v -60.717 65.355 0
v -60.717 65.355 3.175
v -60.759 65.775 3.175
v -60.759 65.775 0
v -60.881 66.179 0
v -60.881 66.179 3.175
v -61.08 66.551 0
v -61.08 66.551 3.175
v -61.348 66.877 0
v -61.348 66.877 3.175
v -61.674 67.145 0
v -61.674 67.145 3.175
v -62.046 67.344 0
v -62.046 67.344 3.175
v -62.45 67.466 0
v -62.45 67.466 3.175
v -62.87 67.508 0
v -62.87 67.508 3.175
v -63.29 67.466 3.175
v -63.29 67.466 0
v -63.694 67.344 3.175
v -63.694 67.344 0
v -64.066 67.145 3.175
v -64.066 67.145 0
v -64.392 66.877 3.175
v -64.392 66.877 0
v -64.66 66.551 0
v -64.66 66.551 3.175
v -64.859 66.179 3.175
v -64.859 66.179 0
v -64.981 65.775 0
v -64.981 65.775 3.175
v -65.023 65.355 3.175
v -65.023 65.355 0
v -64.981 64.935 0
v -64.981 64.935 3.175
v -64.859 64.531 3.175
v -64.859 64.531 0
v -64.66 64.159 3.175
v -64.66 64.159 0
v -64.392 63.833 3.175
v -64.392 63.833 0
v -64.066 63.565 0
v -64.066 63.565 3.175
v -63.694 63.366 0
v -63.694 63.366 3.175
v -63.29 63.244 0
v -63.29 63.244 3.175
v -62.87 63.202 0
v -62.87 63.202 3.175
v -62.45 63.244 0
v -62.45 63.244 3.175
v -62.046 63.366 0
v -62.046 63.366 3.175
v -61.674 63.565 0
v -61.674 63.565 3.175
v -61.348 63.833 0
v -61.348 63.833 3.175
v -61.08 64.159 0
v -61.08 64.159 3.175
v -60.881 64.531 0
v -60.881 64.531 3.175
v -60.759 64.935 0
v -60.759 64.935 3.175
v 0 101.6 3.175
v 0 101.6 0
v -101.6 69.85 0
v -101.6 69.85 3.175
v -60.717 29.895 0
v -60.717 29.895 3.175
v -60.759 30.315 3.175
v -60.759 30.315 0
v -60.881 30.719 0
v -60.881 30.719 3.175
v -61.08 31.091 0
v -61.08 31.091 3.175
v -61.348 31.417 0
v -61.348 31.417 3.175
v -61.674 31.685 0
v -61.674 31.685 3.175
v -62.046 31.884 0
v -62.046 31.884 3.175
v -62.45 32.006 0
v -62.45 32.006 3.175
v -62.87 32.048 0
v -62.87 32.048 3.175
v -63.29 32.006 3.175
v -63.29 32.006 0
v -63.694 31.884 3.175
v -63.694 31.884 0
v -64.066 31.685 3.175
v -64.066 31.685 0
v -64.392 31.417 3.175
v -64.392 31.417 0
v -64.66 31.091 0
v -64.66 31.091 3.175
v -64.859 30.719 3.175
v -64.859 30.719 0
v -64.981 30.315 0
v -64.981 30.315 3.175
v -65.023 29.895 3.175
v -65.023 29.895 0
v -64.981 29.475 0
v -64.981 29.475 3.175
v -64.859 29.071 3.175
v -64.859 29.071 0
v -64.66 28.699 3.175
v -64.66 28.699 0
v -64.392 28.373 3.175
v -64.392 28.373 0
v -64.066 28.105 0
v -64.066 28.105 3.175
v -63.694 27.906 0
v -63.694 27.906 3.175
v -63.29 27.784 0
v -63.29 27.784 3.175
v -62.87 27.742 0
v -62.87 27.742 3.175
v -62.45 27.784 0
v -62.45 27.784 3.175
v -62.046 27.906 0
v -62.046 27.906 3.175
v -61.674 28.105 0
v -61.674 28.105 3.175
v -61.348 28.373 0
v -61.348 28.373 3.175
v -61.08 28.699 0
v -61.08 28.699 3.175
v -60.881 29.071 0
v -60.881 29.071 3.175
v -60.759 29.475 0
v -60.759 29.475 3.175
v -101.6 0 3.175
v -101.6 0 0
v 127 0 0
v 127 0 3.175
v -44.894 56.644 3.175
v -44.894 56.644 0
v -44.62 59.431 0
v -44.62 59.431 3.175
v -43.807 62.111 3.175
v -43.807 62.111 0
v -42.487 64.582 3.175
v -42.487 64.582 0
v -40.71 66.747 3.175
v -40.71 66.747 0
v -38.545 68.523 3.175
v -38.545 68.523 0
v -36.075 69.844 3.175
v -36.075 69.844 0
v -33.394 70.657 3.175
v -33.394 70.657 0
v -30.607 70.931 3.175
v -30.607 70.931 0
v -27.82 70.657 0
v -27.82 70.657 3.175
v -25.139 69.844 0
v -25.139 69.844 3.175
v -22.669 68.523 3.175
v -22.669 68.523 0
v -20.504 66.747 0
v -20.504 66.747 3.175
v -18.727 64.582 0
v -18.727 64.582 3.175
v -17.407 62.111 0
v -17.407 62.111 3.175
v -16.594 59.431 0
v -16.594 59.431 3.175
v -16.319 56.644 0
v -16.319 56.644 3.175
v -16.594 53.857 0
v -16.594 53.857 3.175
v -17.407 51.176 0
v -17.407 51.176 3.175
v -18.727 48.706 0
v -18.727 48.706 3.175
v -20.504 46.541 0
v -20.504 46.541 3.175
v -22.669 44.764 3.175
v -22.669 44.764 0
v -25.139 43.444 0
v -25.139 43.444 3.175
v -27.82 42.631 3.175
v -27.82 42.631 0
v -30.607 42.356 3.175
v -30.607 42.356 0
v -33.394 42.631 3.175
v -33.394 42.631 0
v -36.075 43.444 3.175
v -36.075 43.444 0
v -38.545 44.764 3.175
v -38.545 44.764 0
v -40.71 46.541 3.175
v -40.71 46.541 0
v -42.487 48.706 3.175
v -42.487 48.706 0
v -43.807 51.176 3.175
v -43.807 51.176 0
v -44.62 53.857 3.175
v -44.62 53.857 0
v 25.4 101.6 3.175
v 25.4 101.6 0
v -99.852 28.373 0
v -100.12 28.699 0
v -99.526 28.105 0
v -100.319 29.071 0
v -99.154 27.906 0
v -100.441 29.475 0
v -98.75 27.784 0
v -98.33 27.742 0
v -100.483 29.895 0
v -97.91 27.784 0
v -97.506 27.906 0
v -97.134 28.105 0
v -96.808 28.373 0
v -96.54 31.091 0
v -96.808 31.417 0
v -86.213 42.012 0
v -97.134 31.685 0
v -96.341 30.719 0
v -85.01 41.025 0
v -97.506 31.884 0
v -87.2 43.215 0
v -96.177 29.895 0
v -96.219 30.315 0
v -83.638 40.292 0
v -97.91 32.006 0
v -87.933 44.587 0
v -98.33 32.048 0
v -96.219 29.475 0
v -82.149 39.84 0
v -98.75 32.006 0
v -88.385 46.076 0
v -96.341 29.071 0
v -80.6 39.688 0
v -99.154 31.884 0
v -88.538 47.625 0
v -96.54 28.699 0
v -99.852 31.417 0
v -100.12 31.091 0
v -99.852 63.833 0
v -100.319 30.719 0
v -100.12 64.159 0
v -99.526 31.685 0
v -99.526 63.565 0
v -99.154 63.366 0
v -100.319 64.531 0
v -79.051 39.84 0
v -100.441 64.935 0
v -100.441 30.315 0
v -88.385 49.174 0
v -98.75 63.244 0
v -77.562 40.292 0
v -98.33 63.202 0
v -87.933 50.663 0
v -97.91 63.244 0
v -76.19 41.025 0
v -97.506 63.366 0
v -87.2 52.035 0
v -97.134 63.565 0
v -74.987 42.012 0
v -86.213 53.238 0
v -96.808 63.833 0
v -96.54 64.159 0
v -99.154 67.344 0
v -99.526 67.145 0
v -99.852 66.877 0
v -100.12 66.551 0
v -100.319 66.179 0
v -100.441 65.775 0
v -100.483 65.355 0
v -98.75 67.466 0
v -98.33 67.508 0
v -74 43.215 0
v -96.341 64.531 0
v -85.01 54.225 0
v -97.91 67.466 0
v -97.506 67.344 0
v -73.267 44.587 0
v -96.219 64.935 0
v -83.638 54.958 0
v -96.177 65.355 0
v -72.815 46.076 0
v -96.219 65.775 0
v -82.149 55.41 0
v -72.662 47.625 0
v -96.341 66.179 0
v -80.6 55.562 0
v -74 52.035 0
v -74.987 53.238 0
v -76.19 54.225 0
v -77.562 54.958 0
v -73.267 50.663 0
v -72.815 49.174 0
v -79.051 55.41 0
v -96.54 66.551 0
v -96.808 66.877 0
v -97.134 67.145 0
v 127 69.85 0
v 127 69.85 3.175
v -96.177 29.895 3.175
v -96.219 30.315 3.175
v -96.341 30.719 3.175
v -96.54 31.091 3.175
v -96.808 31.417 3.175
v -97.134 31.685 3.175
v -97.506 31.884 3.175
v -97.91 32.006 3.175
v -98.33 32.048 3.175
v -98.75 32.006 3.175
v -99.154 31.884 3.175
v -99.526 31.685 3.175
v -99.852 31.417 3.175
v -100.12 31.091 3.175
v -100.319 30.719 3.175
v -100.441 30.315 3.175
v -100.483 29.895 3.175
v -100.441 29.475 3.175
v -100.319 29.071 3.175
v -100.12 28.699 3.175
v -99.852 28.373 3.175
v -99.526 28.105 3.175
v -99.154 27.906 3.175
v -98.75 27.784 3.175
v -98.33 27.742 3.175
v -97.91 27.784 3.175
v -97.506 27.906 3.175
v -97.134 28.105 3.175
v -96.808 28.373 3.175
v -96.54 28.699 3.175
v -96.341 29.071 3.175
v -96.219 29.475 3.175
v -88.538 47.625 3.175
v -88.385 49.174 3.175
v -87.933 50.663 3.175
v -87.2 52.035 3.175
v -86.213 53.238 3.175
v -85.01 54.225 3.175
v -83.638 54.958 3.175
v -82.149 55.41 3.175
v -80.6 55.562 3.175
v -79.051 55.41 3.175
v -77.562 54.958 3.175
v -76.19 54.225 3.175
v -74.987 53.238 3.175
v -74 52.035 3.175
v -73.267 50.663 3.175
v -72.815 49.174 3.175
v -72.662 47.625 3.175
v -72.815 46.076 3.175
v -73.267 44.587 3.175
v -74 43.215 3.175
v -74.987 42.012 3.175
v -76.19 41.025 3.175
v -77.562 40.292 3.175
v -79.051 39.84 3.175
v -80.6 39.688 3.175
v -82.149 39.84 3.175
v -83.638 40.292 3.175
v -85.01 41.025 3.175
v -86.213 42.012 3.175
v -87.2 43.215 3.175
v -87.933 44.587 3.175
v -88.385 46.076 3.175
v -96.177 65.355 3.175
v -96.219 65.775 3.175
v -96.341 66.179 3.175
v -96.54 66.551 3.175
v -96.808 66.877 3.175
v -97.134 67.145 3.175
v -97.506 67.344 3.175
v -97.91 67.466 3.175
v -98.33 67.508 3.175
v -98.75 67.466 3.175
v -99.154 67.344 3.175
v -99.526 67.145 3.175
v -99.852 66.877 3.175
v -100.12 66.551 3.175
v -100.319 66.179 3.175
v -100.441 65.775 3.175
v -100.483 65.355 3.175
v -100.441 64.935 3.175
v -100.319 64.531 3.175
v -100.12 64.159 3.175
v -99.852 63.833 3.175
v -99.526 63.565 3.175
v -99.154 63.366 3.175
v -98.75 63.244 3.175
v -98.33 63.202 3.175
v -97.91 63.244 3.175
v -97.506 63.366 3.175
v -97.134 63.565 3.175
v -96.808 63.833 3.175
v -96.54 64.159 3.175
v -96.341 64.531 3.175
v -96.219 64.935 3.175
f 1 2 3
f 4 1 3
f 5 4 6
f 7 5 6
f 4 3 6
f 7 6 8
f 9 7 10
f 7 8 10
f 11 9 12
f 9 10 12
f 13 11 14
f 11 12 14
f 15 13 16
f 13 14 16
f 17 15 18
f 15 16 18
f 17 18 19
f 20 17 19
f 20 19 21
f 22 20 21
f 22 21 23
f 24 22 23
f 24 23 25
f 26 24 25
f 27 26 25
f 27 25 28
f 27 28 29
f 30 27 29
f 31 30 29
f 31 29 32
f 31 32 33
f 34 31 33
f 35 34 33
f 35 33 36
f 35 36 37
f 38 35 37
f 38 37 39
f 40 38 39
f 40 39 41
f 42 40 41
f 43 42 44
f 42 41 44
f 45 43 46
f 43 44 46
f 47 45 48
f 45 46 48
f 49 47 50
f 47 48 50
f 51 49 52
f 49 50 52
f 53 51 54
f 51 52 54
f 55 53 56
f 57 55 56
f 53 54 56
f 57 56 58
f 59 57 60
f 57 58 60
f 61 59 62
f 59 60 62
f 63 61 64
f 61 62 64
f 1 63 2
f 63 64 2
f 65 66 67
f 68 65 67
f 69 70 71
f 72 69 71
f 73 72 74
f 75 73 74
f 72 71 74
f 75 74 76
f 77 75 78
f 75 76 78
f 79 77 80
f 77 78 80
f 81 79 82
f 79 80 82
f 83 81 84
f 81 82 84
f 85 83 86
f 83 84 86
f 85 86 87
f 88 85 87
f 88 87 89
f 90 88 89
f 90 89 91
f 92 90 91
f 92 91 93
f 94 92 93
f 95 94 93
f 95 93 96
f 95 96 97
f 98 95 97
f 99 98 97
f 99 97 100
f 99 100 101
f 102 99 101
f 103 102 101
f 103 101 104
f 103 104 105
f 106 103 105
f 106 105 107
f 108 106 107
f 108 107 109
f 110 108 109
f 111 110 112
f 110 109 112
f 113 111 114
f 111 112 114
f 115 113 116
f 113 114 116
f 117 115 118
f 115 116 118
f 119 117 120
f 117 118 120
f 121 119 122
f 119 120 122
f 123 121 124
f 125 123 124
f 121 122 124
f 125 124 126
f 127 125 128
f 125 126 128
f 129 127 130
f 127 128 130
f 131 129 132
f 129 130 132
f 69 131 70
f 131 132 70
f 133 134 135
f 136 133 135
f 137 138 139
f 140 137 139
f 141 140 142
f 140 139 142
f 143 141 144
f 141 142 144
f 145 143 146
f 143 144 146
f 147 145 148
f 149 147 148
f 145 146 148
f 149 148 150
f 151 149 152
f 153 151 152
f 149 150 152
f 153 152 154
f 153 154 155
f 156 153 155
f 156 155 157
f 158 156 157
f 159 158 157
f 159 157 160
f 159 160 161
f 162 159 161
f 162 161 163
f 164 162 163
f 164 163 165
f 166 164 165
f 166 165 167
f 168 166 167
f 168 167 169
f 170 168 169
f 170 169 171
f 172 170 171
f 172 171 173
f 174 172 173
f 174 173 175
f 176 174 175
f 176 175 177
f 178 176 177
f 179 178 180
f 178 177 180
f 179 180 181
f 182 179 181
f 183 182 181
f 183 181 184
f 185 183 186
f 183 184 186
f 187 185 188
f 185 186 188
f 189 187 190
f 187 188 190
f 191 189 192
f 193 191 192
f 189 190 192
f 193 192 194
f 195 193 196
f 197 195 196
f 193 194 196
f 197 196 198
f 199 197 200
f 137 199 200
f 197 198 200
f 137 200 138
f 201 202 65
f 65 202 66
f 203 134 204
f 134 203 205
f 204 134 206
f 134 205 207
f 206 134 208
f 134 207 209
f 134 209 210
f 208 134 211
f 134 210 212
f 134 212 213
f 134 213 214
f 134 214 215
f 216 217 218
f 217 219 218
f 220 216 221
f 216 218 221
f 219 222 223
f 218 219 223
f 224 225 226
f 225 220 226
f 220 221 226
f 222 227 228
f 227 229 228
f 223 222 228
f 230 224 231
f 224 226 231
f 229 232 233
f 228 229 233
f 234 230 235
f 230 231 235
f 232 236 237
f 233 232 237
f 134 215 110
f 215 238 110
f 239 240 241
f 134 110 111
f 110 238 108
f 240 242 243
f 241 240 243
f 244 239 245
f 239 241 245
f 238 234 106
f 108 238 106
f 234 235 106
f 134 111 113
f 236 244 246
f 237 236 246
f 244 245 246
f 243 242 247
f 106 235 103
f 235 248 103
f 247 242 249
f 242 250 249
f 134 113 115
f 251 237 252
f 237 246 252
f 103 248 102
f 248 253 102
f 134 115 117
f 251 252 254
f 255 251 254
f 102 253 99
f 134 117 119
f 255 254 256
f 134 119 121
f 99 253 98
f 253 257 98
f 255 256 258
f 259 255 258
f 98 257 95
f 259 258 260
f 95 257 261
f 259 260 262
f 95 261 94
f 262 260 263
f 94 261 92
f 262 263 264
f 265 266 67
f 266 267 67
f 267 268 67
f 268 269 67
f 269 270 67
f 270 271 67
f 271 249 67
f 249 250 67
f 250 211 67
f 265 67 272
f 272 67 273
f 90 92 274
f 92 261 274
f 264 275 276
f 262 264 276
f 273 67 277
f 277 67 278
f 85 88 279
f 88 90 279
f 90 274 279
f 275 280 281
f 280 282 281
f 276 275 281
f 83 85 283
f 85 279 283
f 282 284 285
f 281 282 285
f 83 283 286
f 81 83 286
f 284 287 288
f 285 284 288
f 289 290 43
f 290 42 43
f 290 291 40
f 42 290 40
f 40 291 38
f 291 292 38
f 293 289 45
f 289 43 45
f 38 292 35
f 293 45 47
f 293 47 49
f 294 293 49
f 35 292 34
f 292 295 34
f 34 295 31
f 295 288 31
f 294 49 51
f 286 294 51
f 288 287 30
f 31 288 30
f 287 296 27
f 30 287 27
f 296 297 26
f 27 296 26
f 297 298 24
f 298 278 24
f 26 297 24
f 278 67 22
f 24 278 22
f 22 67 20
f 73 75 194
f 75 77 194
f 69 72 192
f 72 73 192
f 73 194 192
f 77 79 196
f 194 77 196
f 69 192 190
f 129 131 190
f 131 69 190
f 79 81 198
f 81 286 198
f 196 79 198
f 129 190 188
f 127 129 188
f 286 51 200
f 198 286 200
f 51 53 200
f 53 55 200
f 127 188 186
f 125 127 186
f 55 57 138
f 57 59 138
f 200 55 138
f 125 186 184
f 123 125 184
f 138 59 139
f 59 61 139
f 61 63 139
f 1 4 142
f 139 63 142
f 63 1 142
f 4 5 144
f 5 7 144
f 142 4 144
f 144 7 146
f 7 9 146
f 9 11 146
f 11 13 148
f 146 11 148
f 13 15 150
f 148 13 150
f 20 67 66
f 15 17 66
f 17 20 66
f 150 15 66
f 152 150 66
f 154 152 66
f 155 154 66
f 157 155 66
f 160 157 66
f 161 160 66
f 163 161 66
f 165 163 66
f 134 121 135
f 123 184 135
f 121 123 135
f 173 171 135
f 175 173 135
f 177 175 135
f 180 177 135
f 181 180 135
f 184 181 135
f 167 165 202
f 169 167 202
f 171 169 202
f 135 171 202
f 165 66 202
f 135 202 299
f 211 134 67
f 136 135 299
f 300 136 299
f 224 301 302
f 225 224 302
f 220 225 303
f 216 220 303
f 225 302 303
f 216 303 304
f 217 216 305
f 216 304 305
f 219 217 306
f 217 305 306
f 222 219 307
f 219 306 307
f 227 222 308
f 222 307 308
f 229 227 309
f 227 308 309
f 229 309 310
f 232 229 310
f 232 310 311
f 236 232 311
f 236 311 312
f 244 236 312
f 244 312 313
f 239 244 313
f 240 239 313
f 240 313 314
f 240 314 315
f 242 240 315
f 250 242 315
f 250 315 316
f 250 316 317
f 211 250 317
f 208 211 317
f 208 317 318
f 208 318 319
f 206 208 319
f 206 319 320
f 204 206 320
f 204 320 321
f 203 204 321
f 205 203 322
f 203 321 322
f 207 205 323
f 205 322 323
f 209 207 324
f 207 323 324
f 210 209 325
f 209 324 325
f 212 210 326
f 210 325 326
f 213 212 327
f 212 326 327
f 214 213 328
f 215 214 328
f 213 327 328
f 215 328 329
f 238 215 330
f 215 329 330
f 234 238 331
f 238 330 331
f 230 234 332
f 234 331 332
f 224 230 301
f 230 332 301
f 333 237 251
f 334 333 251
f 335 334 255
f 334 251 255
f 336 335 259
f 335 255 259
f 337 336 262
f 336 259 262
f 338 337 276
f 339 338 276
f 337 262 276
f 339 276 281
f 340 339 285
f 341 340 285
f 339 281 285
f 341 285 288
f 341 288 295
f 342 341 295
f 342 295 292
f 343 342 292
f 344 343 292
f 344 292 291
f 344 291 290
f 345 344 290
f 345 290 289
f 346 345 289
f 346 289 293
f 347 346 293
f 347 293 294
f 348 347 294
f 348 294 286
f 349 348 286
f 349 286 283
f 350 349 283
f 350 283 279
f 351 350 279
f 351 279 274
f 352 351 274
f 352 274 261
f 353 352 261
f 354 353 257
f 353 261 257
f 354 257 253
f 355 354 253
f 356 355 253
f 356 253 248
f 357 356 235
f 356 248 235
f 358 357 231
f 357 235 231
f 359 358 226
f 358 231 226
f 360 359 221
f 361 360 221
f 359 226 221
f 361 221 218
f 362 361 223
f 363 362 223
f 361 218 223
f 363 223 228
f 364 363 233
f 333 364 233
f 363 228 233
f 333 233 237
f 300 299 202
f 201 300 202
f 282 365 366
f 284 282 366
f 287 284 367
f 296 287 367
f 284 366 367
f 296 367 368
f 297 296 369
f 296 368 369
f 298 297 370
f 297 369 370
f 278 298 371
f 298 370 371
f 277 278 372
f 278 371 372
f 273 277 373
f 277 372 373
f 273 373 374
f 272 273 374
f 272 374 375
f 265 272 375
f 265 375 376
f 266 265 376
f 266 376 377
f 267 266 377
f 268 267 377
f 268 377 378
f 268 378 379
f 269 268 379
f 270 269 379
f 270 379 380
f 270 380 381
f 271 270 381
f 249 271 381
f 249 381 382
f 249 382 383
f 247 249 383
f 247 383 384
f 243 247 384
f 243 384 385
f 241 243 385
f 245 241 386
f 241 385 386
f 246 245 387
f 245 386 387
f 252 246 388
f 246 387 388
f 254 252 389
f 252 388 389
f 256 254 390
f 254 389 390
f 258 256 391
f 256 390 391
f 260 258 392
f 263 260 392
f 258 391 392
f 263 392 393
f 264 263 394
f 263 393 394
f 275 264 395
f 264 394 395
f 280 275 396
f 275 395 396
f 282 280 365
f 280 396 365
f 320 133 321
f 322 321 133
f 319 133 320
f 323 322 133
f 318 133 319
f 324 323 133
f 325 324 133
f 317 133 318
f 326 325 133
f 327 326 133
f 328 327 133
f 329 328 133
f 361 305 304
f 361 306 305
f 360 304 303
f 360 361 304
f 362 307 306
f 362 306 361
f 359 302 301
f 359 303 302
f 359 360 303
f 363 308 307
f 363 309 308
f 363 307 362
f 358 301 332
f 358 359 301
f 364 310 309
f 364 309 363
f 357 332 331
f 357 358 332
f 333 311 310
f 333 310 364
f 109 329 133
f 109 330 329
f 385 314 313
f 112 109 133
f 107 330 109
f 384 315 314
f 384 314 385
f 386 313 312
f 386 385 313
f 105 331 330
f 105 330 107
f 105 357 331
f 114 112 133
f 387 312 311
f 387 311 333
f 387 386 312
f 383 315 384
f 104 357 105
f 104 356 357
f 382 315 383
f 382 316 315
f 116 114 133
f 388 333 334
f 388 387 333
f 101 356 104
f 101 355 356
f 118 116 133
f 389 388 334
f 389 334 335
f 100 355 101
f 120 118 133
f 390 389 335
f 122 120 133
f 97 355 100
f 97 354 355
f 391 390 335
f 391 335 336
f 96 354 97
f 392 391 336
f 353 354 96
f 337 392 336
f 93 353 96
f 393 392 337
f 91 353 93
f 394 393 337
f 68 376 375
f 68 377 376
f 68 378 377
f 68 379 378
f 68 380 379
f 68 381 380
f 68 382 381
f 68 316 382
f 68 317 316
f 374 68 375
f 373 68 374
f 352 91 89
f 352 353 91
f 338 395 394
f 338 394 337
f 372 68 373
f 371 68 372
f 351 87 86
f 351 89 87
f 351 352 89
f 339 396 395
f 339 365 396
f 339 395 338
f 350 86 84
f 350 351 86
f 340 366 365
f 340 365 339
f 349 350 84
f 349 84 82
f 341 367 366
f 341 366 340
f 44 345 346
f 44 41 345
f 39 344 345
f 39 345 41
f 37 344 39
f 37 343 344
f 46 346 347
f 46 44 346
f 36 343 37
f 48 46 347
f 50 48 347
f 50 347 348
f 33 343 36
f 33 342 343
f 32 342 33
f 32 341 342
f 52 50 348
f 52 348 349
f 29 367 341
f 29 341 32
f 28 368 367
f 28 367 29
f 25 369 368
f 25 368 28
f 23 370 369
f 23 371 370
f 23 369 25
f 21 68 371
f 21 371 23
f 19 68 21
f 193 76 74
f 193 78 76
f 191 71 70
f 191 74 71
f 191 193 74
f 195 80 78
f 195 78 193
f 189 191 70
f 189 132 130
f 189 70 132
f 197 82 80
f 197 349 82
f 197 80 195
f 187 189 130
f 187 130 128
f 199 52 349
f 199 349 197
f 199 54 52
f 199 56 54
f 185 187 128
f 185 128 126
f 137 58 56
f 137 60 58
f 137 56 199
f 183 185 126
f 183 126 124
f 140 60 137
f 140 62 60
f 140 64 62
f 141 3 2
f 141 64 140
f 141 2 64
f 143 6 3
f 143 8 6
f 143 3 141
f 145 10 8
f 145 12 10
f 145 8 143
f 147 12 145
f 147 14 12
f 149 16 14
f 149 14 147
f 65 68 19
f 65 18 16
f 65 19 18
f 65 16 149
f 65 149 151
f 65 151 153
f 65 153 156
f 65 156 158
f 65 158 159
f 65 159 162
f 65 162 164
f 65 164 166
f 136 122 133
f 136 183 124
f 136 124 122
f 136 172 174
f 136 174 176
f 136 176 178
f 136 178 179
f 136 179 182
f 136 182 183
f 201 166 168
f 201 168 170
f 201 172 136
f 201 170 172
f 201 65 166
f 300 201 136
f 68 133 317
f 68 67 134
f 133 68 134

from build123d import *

# Parameters (mm, degrees)
BOSS_EXTRUDE1_DEPTH   = 3.175
SKETCH5_R             = 7.9375
CUT_EXTRUDE2_DEPTH    = 163.67034341
F_8_CLEARANCE_HOLE2_D = 4.3053
SKETCH8_R             = 14.2875
CUT_EXTRUDE3_DEPTH    = 163.67034341


with BuildPart() as part:
    # Sketch1 → Boss-Extrude1 (new body)
    with BuildSketch(Plane.XY):
        Polygon((0, 101.6), (-101.6, 69.85), (-101.6, 0), (0, 0), (127, 0), (127, 69.85), (25.4, 101.6), align=None)
    extrude(amount=BOSS_EXTRUDE1_DEPTH)

    # Sketch5 → Cut-Extrude2 (cut, through all)
    with BuildSketch(Plane(origin=(0, 0, 0), x_dir=(-1, 0, 0), z_dir=(0, 0, -1))):
        with Locations((80.6, 47.625)):
            Circle(SKETCH5_R)
    extrude(amount=-CUT_EXTRUDE2_DEPTH, mode=Mode.SUBTRACT)

    # #8 Clearance Hole2 (through all)
    with Locations(Plane(origin=(0, 0, 0), x_dir=(-1, 0, 0), z_dir=(0, 0, -1))):
        with Locations((80.6, 47.625), (98.33, 29.895), (62.87, 65.355), (62.87, 29.895), (98.33, 65.355)):
            Hole(F_8_CLEARANCE_HOLE2_D / 2)

    # Sketch8 → Cut-Extrude3 (cut, through all)
    with BuildSketch(Plane(origin=(0, 0, 0), x_dir=(-1, 0, 0), z_dir=(0, 0, -1))):
        with Locations((30.607, 56.643866392)):
            Circle(SKETCH8_R)
    extrude(amount=-CUT_EXTRUDE3_DEPTH, mode=Mode.SUBTRACT)


solid = part.part
